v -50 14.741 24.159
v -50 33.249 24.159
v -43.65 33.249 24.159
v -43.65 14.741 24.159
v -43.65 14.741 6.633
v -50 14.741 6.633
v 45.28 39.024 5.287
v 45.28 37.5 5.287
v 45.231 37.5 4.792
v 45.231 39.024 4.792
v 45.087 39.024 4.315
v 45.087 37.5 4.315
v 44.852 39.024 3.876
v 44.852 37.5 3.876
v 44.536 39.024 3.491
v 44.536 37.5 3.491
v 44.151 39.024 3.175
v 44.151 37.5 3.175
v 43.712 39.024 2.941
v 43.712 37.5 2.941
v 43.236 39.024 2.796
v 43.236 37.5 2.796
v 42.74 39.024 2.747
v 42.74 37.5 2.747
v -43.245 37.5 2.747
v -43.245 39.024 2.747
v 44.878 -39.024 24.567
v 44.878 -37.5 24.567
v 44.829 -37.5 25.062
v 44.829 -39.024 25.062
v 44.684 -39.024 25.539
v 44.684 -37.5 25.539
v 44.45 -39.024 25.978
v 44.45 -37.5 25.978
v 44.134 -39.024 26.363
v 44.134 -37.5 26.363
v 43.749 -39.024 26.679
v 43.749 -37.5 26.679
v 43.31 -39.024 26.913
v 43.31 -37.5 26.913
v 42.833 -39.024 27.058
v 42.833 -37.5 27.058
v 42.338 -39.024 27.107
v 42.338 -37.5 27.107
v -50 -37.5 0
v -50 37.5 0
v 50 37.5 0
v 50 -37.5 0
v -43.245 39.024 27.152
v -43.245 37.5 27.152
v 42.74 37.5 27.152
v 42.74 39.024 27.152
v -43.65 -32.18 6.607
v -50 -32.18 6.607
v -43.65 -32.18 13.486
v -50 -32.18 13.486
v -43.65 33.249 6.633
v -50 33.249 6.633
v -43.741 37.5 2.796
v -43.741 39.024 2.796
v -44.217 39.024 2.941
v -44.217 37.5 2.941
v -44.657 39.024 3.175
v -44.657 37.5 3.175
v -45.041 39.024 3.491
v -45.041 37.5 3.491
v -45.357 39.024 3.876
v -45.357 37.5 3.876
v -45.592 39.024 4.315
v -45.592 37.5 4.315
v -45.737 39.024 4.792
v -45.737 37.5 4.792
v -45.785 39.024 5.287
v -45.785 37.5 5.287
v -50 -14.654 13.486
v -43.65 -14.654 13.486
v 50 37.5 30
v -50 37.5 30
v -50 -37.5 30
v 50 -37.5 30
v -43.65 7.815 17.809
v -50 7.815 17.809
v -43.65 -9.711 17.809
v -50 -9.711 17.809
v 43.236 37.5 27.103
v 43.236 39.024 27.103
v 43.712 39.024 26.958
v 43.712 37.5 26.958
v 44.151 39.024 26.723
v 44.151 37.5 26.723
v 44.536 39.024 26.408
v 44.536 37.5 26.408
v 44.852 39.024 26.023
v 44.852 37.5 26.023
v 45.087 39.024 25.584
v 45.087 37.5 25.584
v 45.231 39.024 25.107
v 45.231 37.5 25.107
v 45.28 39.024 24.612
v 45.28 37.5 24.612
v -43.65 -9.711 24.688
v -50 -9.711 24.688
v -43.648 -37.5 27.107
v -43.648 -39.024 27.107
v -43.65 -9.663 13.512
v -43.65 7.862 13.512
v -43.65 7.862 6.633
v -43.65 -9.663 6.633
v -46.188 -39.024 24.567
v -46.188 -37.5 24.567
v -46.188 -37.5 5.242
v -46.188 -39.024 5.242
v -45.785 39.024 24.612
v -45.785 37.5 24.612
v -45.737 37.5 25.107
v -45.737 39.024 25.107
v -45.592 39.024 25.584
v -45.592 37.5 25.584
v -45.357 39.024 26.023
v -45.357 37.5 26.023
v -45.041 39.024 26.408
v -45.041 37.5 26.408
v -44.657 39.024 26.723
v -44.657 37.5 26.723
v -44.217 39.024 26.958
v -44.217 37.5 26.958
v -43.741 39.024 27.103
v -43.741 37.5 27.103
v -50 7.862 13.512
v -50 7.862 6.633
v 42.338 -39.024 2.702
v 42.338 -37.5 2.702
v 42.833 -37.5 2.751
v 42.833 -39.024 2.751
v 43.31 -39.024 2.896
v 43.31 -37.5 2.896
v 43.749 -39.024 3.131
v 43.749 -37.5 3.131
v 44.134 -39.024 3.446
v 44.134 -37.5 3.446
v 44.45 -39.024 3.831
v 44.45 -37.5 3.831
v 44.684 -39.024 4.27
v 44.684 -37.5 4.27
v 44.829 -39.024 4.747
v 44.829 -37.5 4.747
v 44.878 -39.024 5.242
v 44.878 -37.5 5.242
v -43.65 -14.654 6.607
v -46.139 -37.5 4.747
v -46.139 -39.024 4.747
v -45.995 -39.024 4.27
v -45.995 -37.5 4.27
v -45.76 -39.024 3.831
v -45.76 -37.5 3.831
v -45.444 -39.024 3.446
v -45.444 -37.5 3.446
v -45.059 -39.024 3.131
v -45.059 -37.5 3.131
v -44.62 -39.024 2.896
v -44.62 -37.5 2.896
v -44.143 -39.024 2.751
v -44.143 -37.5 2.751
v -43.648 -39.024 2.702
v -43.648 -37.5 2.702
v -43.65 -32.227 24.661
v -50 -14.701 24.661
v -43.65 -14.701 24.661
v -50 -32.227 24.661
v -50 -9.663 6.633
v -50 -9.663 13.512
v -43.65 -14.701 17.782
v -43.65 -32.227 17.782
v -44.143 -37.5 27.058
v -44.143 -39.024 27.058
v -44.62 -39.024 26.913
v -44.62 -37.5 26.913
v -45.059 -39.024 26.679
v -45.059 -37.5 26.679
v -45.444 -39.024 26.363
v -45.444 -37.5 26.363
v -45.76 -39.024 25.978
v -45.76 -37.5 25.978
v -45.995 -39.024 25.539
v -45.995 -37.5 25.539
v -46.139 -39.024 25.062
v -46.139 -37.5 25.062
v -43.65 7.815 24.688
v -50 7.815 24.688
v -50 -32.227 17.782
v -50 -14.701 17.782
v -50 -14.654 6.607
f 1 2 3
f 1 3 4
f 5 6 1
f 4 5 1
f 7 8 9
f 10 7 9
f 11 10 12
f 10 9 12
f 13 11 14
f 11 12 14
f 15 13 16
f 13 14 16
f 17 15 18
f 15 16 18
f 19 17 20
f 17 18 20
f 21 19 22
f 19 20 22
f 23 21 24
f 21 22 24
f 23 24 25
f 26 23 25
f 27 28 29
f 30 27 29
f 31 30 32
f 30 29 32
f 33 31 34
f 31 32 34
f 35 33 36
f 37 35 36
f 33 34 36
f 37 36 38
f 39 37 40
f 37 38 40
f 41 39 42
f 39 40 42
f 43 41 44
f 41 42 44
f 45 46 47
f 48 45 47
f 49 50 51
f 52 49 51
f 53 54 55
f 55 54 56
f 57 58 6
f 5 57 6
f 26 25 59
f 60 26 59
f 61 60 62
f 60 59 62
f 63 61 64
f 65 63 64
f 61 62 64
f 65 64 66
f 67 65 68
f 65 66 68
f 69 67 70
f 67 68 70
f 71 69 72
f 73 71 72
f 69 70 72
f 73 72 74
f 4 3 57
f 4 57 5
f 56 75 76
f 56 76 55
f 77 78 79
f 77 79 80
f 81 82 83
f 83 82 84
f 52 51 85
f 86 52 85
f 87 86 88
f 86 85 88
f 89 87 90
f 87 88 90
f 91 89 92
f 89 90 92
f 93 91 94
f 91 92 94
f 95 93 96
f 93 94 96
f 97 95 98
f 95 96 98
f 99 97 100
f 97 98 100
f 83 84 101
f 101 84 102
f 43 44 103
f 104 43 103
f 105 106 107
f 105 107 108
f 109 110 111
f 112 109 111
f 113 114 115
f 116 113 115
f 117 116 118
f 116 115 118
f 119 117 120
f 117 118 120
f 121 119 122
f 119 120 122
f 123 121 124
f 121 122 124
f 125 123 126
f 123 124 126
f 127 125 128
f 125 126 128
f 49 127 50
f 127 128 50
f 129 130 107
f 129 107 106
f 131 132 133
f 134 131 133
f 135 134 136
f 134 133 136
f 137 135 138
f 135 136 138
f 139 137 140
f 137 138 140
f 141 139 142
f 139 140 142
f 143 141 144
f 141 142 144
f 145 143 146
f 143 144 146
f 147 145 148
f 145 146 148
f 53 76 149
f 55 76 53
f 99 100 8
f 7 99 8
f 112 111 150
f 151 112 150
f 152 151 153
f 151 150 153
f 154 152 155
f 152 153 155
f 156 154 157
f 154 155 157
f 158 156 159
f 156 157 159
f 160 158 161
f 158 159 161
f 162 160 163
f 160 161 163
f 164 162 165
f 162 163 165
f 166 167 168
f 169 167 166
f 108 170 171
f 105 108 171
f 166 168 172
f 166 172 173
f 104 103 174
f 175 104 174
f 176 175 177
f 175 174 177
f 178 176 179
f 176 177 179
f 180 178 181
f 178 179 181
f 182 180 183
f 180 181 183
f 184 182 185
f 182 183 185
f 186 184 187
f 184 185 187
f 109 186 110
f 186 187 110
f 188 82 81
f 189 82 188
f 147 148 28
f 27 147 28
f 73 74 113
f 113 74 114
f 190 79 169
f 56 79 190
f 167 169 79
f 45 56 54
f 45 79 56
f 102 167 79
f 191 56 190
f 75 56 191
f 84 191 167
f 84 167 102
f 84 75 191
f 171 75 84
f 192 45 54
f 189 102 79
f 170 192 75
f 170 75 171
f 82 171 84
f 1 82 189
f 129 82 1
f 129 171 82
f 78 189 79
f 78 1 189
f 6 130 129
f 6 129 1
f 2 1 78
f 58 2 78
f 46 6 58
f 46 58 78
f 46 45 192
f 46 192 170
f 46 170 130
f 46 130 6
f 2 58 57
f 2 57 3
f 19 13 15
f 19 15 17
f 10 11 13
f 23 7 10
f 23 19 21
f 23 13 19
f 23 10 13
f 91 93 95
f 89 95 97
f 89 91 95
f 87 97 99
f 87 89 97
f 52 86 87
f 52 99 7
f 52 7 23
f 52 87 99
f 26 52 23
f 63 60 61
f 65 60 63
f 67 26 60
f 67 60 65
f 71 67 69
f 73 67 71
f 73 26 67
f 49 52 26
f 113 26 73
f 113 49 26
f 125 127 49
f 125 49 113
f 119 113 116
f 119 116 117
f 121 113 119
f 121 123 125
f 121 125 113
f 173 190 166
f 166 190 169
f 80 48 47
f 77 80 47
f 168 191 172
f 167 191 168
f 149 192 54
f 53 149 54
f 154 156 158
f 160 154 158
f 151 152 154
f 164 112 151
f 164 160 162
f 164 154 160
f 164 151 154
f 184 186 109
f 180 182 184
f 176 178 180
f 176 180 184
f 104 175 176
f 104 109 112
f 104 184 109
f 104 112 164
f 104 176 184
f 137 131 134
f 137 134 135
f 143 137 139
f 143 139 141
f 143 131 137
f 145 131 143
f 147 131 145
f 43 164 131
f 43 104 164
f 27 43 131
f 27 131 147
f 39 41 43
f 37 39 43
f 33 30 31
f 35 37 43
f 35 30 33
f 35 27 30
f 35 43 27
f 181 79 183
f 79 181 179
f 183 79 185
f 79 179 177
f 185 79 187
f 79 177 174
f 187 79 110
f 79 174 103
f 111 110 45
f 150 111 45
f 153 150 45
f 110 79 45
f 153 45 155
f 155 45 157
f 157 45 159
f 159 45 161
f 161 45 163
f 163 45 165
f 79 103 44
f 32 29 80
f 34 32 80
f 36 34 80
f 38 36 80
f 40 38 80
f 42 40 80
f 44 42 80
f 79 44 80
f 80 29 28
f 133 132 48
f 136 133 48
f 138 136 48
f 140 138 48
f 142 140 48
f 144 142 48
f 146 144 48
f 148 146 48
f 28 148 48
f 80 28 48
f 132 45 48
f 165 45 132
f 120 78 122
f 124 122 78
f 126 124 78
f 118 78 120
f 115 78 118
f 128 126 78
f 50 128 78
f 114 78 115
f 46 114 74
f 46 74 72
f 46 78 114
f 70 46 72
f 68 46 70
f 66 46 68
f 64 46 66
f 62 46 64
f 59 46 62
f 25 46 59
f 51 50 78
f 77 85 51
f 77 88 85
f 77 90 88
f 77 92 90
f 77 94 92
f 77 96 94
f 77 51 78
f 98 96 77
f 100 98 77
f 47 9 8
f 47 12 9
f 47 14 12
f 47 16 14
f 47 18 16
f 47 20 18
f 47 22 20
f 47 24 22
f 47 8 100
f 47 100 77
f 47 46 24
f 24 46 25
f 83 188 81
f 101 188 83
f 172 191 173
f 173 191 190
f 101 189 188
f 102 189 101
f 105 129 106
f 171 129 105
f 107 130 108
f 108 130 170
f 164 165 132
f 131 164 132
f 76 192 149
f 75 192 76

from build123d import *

# Parameters (mm, degrees)
F0_W     = 100
F0_H     = 75
F1_DEPTH = 30
F3_DEPTH = 1.524
F5_DEPTH = 1.524
F6_W     = 18.507942
F6_H     = 17.525221
F6_W_2   = 17.525221
F6_H_2   = 6.879058
F6_W_3   = 17.525222
F6_H_3   = 6.879059
F7_DEPTH = 6.35


with BuildPart() as f1:
    # F0 (on Top) → F1 (new body)
    with BuildSketch(Plane.XY):
        Rectangle(F0_W, F0_H)
    extrude(amount=F1_DEPTH)

    # F2 (on face) → F3 (join)
    with BuildSketch(Plane.XZ.offset(37.5)):
        with BuildLine():
            Line((42.337663, 27.106768), (-43.647963, 27.106768))
            ThreePointArc((-43.647963, 27.106768), (-45.444015, 26.362819), (-46.187963, 24.566768))
            Line((-46.187963, 24.566768), (-46.187963, 5.242487))
            ThreePointArc((-46.187963, 5.242487), (-45.444015, 3.446436), (-43.647963, 2.702487))
            Line((-43.647963, 2.702487), (42.337663, 2.702487))
            ThreePointArc((42.337663, 2.702487), (44.133714, 3.446436), (44.877663, 5.242487))
            Line((44.877663, 5.242487), (44.877663, 24.566768))
            ThreePointArc((44.877663, 24.566768), (44.133714, 26.362819), (42.337663, 27.106768))
        make_face()
    extrude(amount=F3_DEPTH)

    # F4 (on face) → F5 (join)
    with BuildSketch(Plane(origin=(0, 37.5, 0), x_dir=(-1, 0, 0), z_dir=(0, 1, 0))):
        with BuildLine():
            Line((43.245368, 27.151501), (-42.740258, 27.151501))
            ThreePointArc((-42.740258, 27.151501), (-44.53631, 26.407552), (-45.280258, 24.611501))
            Line((-45.280258, 24.611501), (-45.280258, 5.287221))
            ThreePointArc((-45.280258, 5.287221), (-44.53631, 3.491169), (-42.740258, 2.747221))
            Line((-42.740258, 2.747221), (43.245368, 2.747221))
            ThreePointArc((43.245368, 2.747221), (45.041419, 3.491169), (45.785368, 5.287221))
            Line((45.785368, 5.287221), (45.785368, 24.611501))
            ThreePointArc((45.785368, 24.611501), (45.041419, 26.407552), (43.245368, 27.151501))
        make_face()
    extrude(amount=F5_DEPTH)

    # F6 (on face) → F7 (cut)
    with BuildSketch(Plane(origin=(-50, 0, 0), x_dir=(0, -1, 0), z_dir=(-1, 0, 0))):
        with Locations((-23.994811, 15.395988)):
            Rectangle(F6_W, F6_H)
        with Locations((0.900829, 10.072907)):
            Rectangle(F6_W_2, F6_H_2)
        with Locations((0.947953, 21.248168)):
            Rectangle(F6_W_3, F6_H_3)
        with Locations((23.416942, 10.046705)):
            Rectangle(F6_W_2, F6_H_3)
        with Locations((23.464066, 21.221965)):
            Rectangle(F6_W_3, F6_H_3)
    extrude(amount=-F7_DEPTH, mode=Mode.SUBTRACT)


solid = f1.part
